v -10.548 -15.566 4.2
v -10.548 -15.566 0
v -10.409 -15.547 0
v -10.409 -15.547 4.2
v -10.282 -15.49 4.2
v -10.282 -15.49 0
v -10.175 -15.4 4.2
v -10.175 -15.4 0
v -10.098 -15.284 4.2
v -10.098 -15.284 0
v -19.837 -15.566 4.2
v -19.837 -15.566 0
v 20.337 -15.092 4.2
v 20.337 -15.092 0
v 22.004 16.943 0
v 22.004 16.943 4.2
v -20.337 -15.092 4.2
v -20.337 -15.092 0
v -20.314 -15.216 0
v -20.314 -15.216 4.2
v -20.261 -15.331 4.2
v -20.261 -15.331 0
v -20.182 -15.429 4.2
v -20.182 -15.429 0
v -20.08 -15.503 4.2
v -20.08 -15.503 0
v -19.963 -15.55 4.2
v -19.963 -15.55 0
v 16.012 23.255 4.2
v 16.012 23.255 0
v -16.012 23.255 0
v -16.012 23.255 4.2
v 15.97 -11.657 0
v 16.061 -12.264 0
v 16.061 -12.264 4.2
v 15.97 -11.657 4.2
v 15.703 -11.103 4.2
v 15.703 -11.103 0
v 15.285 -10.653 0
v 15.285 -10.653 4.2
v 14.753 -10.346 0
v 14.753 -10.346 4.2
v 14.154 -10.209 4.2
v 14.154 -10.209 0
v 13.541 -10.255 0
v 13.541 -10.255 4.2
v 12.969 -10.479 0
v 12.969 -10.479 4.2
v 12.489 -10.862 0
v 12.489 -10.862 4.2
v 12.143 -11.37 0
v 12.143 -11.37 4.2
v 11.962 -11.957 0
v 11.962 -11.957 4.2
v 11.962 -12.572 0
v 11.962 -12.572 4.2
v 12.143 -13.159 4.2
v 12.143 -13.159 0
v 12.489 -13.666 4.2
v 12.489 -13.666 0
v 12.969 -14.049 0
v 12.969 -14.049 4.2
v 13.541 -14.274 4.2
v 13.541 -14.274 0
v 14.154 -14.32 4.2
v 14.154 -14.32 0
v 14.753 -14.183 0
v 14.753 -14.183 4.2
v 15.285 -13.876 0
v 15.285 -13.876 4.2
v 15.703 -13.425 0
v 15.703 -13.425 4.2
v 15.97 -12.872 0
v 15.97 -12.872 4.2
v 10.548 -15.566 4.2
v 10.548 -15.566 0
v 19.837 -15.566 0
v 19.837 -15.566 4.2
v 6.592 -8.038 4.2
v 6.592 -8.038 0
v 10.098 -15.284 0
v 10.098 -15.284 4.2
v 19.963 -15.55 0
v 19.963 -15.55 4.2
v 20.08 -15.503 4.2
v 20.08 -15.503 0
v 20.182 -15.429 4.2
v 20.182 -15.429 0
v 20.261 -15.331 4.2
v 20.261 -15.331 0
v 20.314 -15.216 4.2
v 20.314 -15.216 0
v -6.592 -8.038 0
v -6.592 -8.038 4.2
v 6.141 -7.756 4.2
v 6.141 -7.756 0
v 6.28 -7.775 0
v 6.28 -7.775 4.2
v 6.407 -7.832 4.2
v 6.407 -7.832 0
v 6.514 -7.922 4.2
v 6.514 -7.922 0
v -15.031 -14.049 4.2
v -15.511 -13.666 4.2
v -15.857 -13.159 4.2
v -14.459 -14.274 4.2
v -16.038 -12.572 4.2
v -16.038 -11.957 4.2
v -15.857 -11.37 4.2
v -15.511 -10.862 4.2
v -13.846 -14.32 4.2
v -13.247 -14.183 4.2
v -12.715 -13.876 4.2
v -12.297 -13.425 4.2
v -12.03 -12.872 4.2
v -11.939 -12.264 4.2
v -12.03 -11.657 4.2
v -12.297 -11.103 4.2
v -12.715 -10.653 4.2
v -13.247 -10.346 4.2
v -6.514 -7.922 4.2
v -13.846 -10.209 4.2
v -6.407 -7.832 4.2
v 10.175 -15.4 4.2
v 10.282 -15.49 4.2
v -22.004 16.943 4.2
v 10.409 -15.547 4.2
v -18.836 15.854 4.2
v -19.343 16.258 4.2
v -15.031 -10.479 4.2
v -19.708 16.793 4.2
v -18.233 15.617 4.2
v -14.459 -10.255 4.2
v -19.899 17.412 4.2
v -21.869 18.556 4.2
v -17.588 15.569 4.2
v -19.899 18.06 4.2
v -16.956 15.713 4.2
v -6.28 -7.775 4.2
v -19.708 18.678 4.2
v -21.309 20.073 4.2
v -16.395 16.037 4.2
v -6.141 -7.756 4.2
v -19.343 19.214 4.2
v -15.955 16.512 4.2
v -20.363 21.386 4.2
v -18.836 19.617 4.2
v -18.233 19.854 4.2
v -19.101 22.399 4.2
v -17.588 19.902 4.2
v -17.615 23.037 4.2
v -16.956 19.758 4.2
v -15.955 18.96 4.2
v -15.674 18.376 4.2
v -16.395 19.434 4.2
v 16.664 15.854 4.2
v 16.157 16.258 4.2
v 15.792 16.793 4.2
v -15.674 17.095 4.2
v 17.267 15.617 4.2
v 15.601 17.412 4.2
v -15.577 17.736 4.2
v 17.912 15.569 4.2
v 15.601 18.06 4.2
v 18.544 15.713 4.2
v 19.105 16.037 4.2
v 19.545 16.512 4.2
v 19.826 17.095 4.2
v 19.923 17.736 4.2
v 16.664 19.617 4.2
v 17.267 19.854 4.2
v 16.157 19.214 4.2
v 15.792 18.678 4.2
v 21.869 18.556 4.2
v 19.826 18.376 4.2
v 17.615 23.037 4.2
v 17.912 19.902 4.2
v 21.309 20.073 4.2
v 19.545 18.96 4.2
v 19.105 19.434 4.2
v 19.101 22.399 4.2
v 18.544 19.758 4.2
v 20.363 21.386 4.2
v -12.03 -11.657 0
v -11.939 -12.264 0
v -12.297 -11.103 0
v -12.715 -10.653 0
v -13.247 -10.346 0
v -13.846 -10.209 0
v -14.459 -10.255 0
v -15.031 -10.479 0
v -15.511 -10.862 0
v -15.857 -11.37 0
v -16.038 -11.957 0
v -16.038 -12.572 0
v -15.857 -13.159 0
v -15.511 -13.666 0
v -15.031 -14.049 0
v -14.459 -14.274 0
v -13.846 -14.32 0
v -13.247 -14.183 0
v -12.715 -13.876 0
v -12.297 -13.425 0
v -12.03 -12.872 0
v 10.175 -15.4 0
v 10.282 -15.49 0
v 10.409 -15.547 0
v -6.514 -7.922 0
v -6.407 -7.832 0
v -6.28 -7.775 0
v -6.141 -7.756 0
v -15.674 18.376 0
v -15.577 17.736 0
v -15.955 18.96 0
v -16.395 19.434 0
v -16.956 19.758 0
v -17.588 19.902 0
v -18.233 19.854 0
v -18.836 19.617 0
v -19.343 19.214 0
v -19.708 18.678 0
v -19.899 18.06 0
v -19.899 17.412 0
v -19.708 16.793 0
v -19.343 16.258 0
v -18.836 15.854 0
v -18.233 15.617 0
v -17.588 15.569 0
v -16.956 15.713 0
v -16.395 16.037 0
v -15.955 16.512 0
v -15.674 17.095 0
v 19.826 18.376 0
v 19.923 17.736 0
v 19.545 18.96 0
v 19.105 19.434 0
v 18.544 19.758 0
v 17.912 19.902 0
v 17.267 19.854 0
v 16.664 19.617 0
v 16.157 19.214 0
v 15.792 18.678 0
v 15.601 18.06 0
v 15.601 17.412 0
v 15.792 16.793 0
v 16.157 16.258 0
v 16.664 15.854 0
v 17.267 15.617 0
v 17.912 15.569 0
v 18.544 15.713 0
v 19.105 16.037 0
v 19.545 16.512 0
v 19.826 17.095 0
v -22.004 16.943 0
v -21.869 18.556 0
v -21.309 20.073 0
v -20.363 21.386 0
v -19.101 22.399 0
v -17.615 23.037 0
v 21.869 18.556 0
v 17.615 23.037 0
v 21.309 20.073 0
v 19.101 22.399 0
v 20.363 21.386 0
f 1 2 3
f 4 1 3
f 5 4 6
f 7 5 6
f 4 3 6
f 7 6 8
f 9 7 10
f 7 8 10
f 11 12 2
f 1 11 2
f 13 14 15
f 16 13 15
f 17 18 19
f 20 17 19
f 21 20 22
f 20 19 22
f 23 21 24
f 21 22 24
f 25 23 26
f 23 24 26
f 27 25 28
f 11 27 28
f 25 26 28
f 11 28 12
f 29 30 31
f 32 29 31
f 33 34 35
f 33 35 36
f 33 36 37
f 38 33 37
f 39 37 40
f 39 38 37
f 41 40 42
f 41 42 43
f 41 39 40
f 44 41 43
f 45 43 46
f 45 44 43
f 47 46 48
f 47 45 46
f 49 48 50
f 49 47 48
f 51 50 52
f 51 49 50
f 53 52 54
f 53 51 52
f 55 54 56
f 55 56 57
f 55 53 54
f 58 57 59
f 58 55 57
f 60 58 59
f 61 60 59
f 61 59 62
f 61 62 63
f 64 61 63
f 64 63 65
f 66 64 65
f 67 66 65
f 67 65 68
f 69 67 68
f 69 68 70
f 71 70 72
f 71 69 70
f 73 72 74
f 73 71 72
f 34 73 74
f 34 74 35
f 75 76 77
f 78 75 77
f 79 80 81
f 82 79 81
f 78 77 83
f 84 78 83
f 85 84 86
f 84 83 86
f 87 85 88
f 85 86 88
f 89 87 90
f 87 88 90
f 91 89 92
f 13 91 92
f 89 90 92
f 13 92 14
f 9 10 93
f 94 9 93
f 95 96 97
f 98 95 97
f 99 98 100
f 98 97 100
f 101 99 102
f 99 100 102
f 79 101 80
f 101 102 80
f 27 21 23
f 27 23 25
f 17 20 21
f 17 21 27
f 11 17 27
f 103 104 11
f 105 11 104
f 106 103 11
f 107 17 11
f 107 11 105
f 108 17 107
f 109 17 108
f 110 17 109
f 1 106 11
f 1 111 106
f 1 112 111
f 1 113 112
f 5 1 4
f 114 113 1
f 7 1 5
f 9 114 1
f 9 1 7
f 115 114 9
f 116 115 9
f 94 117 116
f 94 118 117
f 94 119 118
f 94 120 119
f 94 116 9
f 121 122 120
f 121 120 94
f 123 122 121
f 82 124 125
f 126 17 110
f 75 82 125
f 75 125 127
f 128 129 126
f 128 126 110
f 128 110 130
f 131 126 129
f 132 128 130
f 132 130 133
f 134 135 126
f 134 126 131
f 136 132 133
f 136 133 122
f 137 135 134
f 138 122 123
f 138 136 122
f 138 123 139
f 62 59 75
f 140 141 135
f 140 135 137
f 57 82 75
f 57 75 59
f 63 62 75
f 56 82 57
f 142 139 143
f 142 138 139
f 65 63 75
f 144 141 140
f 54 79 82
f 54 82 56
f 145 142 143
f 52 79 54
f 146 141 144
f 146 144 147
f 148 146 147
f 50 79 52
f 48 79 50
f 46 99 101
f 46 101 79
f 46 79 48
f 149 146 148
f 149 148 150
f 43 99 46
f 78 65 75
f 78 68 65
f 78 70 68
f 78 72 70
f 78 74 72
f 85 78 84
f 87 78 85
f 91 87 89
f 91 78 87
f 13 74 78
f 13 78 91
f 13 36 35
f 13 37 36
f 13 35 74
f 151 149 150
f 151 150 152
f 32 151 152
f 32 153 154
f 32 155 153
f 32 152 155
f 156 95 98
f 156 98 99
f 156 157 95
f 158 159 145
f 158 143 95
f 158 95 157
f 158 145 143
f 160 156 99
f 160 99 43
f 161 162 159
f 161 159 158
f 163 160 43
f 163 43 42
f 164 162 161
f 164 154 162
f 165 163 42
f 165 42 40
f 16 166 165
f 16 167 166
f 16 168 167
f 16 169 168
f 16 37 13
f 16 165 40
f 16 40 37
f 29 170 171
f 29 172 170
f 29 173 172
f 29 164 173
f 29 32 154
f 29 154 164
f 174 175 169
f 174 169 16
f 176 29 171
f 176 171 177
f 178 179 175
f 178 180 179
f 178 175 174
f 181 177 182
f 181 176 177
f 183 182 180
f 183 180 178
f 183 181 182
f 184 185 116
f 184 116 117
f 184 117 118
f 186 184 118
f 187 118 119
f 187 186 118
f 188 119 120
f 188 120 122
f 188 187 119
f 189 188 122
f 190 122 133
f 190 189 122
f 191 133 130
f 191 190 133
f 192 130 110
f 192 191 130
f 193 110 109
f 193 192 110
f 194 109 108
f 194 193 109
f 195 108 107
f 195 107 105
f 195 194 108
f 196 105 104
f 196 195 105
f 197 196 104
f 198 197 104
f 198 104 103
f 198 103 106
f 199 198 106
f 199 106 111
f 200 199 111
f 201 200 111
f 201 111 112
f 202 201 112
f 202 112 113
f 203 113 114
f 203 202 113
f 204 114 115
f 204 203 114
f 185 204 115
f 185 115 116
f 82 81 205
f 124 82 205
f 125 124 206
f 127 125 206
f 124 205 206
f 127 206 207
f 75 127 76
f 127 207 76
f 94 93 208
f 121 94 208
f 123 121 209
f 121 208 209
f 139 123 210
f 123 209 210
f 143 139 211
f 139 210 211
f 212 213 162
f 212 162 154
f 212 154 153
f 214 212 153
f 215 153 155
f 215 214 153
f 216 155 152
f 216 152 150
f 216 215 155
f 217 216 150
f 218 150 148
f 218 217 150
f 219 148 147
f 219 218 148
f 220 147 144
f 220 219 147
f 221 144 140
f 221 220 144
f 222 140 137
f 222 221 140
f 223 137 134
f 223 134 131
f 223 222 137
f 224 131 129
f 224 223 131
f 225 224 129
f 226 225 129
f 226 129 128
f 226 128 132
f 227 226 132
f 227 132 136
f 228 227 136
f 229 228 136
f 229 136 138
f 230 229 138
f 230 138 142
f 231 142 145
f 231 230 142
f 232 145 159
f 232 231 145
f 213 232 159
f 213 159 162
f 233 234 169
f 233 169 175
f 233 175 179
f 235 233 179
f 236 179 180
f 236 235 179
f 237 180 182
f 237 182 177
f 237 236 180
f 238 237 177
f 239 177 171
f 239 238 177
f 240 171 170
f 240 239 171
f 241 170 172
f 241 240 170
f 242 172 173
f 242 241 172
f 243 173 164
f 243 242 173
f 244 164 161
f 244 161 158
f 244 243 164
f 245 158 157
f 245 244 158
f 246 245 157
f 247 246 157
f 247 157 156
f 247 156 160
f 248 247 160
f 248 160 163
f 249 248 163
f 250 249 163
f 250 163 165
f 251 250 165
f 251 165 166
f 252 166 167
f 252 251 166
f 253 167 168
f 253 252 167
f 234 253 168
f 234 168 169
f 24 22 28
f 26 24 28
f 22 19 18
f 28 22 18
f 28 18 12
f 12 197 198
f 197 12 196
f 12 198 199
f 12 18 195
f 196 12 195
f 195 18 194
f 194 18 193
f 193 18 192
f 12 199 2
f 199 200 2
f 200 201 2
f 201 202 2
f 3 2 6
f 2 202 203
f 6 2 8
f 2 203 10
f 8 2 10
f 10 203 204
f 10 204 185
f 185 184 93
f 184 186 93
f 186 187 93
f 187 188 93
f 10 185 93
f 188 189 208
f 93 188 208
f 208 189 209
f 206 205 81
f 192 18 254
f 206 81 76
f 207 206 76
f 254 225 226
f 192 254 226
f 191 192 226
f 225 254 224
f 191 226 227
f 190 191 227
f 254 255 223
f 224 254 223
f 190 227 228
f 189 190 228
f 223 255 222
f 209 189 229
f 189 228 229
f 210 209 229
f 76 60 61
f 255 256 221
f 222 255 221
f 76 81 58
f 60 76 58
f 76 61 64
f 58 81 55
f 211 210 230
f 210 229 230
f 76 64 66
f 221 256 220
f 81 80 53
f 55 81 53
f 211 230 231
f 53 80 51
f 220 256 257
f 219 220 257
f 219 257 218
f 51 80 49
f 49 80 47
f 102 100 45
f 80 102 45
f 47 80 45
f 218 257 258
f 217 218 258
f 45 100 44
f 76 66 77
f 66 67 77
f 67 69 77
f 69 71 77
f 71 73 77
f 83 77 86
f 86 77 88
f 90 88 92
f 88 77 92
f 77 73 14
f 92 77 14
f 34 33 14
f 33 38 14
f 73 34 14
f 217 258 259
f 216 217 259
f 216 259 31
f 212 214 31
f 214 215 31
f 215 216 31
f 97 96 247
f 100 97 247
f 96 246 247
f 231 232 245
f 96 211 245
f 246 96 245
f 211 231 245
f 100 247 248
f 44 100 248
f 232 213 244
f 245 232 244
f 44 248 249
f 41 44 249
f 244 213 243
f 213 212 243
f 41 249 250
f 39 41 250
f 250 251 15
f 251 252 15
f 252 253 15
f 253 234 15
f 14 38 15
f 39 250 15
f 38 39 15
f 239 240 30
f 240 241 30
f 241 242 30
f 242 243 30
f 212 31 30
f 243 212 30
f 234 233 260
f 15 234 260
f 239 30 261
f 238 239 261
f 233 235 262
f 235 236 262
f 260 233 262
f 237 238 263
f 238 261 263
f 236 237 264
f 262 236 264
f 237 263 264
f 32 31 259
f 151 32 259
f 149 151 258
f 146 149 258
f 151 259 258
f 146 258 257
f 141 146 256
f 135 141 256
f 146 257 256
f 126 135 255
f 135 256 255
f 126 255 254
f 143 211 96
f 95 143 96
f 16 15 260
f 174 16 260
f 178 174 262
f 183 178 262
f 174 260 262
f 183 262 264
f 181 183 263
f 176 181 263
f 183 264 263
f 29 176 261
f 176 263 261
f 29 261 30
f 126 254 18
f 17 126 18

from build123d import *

# Parameters (mm, degrees)
F0_R     = 2.061288
F0_R_2   = 2.172791
F1_DEPTH = 4.2


with BuildPart() as f1:
    # F0 (on Top) → F1 (new body)
    with BuildSketch(Plane.XY):
        with BuildLine():
            Line((16.011793, 23.255279), (0, 23.255279))
            Line((0, 23.255279), (-16.011793, 23.255279))
            ThreePointArc((-16.011793, 23.255279), (-20.363271, 21.386215), (-22.003686, 16.94349))
            Line((-22.003686, 16.94349), (-20.336709, -15.092083))
            ThreePointArc((-20.336709, -15.092083), (-20.181629, -15.428724), (-19.837385, -15.566101))
            Line((-19.837385, -15.566101), (-10.547646, -15.566101))
            ThreePointArc((-10.547646, -15.566101), (-10.282024, -15.48971), (-10.097566, -15.283881))
            Line((-10.097566, -15.283881), (-6.591564, -8.038143))
            ThreePointArc((-6.591564, -8.038143), (-6.407106, -7.832314), (-6.141484, -7.755924))
            Line((-6.141484, -7.755924), (0, -7.755924))
            Line((0, -7.755924), (6.141484, -7.755924))
            ThreePointArc((6.141484, -7.755924), (6.407106, -7.832314), (6.591564, -8.038143))
            Line((6.591564, -8.038143), (10.097566, -15.283881))
            ThreePointArc((10.097566, -15.283881), (10.282024, -15.48971), (10.547646, -15.566101))
            Line((10.547646, -15.566101), (19.837385, -15.566101))
            ThreePointArc((19.837385, -15.566101), (20.181629, -15.428724), (20.336709, -15.092083))
            Line((20.336709, -15.092083), (22.003686, 16.94349))
            ThreePointArc((22.003686, 16.94349), (20.363271, 21.386215), (16.011793, 23.255279))
        make_face()
        with Locations((-14, -12.264313)):
            Circle(F0_R, mode=Mode.SUBTRACT)
        with Locations((14, -12.264313)):
            Circle(F0_R, mode=Mode.SUBTRACT)
        with Locations((-17.75, 17.735687)):
            Circle(F0_R_2, mode=Mode.SUBTRACT)
        with Locations((17.75, 17.735687)):
            Circle(F0_R_2, mode=Mode.SUBTRACT)
    extrude(amount=F1_DEPTH)


solid = f1.part
